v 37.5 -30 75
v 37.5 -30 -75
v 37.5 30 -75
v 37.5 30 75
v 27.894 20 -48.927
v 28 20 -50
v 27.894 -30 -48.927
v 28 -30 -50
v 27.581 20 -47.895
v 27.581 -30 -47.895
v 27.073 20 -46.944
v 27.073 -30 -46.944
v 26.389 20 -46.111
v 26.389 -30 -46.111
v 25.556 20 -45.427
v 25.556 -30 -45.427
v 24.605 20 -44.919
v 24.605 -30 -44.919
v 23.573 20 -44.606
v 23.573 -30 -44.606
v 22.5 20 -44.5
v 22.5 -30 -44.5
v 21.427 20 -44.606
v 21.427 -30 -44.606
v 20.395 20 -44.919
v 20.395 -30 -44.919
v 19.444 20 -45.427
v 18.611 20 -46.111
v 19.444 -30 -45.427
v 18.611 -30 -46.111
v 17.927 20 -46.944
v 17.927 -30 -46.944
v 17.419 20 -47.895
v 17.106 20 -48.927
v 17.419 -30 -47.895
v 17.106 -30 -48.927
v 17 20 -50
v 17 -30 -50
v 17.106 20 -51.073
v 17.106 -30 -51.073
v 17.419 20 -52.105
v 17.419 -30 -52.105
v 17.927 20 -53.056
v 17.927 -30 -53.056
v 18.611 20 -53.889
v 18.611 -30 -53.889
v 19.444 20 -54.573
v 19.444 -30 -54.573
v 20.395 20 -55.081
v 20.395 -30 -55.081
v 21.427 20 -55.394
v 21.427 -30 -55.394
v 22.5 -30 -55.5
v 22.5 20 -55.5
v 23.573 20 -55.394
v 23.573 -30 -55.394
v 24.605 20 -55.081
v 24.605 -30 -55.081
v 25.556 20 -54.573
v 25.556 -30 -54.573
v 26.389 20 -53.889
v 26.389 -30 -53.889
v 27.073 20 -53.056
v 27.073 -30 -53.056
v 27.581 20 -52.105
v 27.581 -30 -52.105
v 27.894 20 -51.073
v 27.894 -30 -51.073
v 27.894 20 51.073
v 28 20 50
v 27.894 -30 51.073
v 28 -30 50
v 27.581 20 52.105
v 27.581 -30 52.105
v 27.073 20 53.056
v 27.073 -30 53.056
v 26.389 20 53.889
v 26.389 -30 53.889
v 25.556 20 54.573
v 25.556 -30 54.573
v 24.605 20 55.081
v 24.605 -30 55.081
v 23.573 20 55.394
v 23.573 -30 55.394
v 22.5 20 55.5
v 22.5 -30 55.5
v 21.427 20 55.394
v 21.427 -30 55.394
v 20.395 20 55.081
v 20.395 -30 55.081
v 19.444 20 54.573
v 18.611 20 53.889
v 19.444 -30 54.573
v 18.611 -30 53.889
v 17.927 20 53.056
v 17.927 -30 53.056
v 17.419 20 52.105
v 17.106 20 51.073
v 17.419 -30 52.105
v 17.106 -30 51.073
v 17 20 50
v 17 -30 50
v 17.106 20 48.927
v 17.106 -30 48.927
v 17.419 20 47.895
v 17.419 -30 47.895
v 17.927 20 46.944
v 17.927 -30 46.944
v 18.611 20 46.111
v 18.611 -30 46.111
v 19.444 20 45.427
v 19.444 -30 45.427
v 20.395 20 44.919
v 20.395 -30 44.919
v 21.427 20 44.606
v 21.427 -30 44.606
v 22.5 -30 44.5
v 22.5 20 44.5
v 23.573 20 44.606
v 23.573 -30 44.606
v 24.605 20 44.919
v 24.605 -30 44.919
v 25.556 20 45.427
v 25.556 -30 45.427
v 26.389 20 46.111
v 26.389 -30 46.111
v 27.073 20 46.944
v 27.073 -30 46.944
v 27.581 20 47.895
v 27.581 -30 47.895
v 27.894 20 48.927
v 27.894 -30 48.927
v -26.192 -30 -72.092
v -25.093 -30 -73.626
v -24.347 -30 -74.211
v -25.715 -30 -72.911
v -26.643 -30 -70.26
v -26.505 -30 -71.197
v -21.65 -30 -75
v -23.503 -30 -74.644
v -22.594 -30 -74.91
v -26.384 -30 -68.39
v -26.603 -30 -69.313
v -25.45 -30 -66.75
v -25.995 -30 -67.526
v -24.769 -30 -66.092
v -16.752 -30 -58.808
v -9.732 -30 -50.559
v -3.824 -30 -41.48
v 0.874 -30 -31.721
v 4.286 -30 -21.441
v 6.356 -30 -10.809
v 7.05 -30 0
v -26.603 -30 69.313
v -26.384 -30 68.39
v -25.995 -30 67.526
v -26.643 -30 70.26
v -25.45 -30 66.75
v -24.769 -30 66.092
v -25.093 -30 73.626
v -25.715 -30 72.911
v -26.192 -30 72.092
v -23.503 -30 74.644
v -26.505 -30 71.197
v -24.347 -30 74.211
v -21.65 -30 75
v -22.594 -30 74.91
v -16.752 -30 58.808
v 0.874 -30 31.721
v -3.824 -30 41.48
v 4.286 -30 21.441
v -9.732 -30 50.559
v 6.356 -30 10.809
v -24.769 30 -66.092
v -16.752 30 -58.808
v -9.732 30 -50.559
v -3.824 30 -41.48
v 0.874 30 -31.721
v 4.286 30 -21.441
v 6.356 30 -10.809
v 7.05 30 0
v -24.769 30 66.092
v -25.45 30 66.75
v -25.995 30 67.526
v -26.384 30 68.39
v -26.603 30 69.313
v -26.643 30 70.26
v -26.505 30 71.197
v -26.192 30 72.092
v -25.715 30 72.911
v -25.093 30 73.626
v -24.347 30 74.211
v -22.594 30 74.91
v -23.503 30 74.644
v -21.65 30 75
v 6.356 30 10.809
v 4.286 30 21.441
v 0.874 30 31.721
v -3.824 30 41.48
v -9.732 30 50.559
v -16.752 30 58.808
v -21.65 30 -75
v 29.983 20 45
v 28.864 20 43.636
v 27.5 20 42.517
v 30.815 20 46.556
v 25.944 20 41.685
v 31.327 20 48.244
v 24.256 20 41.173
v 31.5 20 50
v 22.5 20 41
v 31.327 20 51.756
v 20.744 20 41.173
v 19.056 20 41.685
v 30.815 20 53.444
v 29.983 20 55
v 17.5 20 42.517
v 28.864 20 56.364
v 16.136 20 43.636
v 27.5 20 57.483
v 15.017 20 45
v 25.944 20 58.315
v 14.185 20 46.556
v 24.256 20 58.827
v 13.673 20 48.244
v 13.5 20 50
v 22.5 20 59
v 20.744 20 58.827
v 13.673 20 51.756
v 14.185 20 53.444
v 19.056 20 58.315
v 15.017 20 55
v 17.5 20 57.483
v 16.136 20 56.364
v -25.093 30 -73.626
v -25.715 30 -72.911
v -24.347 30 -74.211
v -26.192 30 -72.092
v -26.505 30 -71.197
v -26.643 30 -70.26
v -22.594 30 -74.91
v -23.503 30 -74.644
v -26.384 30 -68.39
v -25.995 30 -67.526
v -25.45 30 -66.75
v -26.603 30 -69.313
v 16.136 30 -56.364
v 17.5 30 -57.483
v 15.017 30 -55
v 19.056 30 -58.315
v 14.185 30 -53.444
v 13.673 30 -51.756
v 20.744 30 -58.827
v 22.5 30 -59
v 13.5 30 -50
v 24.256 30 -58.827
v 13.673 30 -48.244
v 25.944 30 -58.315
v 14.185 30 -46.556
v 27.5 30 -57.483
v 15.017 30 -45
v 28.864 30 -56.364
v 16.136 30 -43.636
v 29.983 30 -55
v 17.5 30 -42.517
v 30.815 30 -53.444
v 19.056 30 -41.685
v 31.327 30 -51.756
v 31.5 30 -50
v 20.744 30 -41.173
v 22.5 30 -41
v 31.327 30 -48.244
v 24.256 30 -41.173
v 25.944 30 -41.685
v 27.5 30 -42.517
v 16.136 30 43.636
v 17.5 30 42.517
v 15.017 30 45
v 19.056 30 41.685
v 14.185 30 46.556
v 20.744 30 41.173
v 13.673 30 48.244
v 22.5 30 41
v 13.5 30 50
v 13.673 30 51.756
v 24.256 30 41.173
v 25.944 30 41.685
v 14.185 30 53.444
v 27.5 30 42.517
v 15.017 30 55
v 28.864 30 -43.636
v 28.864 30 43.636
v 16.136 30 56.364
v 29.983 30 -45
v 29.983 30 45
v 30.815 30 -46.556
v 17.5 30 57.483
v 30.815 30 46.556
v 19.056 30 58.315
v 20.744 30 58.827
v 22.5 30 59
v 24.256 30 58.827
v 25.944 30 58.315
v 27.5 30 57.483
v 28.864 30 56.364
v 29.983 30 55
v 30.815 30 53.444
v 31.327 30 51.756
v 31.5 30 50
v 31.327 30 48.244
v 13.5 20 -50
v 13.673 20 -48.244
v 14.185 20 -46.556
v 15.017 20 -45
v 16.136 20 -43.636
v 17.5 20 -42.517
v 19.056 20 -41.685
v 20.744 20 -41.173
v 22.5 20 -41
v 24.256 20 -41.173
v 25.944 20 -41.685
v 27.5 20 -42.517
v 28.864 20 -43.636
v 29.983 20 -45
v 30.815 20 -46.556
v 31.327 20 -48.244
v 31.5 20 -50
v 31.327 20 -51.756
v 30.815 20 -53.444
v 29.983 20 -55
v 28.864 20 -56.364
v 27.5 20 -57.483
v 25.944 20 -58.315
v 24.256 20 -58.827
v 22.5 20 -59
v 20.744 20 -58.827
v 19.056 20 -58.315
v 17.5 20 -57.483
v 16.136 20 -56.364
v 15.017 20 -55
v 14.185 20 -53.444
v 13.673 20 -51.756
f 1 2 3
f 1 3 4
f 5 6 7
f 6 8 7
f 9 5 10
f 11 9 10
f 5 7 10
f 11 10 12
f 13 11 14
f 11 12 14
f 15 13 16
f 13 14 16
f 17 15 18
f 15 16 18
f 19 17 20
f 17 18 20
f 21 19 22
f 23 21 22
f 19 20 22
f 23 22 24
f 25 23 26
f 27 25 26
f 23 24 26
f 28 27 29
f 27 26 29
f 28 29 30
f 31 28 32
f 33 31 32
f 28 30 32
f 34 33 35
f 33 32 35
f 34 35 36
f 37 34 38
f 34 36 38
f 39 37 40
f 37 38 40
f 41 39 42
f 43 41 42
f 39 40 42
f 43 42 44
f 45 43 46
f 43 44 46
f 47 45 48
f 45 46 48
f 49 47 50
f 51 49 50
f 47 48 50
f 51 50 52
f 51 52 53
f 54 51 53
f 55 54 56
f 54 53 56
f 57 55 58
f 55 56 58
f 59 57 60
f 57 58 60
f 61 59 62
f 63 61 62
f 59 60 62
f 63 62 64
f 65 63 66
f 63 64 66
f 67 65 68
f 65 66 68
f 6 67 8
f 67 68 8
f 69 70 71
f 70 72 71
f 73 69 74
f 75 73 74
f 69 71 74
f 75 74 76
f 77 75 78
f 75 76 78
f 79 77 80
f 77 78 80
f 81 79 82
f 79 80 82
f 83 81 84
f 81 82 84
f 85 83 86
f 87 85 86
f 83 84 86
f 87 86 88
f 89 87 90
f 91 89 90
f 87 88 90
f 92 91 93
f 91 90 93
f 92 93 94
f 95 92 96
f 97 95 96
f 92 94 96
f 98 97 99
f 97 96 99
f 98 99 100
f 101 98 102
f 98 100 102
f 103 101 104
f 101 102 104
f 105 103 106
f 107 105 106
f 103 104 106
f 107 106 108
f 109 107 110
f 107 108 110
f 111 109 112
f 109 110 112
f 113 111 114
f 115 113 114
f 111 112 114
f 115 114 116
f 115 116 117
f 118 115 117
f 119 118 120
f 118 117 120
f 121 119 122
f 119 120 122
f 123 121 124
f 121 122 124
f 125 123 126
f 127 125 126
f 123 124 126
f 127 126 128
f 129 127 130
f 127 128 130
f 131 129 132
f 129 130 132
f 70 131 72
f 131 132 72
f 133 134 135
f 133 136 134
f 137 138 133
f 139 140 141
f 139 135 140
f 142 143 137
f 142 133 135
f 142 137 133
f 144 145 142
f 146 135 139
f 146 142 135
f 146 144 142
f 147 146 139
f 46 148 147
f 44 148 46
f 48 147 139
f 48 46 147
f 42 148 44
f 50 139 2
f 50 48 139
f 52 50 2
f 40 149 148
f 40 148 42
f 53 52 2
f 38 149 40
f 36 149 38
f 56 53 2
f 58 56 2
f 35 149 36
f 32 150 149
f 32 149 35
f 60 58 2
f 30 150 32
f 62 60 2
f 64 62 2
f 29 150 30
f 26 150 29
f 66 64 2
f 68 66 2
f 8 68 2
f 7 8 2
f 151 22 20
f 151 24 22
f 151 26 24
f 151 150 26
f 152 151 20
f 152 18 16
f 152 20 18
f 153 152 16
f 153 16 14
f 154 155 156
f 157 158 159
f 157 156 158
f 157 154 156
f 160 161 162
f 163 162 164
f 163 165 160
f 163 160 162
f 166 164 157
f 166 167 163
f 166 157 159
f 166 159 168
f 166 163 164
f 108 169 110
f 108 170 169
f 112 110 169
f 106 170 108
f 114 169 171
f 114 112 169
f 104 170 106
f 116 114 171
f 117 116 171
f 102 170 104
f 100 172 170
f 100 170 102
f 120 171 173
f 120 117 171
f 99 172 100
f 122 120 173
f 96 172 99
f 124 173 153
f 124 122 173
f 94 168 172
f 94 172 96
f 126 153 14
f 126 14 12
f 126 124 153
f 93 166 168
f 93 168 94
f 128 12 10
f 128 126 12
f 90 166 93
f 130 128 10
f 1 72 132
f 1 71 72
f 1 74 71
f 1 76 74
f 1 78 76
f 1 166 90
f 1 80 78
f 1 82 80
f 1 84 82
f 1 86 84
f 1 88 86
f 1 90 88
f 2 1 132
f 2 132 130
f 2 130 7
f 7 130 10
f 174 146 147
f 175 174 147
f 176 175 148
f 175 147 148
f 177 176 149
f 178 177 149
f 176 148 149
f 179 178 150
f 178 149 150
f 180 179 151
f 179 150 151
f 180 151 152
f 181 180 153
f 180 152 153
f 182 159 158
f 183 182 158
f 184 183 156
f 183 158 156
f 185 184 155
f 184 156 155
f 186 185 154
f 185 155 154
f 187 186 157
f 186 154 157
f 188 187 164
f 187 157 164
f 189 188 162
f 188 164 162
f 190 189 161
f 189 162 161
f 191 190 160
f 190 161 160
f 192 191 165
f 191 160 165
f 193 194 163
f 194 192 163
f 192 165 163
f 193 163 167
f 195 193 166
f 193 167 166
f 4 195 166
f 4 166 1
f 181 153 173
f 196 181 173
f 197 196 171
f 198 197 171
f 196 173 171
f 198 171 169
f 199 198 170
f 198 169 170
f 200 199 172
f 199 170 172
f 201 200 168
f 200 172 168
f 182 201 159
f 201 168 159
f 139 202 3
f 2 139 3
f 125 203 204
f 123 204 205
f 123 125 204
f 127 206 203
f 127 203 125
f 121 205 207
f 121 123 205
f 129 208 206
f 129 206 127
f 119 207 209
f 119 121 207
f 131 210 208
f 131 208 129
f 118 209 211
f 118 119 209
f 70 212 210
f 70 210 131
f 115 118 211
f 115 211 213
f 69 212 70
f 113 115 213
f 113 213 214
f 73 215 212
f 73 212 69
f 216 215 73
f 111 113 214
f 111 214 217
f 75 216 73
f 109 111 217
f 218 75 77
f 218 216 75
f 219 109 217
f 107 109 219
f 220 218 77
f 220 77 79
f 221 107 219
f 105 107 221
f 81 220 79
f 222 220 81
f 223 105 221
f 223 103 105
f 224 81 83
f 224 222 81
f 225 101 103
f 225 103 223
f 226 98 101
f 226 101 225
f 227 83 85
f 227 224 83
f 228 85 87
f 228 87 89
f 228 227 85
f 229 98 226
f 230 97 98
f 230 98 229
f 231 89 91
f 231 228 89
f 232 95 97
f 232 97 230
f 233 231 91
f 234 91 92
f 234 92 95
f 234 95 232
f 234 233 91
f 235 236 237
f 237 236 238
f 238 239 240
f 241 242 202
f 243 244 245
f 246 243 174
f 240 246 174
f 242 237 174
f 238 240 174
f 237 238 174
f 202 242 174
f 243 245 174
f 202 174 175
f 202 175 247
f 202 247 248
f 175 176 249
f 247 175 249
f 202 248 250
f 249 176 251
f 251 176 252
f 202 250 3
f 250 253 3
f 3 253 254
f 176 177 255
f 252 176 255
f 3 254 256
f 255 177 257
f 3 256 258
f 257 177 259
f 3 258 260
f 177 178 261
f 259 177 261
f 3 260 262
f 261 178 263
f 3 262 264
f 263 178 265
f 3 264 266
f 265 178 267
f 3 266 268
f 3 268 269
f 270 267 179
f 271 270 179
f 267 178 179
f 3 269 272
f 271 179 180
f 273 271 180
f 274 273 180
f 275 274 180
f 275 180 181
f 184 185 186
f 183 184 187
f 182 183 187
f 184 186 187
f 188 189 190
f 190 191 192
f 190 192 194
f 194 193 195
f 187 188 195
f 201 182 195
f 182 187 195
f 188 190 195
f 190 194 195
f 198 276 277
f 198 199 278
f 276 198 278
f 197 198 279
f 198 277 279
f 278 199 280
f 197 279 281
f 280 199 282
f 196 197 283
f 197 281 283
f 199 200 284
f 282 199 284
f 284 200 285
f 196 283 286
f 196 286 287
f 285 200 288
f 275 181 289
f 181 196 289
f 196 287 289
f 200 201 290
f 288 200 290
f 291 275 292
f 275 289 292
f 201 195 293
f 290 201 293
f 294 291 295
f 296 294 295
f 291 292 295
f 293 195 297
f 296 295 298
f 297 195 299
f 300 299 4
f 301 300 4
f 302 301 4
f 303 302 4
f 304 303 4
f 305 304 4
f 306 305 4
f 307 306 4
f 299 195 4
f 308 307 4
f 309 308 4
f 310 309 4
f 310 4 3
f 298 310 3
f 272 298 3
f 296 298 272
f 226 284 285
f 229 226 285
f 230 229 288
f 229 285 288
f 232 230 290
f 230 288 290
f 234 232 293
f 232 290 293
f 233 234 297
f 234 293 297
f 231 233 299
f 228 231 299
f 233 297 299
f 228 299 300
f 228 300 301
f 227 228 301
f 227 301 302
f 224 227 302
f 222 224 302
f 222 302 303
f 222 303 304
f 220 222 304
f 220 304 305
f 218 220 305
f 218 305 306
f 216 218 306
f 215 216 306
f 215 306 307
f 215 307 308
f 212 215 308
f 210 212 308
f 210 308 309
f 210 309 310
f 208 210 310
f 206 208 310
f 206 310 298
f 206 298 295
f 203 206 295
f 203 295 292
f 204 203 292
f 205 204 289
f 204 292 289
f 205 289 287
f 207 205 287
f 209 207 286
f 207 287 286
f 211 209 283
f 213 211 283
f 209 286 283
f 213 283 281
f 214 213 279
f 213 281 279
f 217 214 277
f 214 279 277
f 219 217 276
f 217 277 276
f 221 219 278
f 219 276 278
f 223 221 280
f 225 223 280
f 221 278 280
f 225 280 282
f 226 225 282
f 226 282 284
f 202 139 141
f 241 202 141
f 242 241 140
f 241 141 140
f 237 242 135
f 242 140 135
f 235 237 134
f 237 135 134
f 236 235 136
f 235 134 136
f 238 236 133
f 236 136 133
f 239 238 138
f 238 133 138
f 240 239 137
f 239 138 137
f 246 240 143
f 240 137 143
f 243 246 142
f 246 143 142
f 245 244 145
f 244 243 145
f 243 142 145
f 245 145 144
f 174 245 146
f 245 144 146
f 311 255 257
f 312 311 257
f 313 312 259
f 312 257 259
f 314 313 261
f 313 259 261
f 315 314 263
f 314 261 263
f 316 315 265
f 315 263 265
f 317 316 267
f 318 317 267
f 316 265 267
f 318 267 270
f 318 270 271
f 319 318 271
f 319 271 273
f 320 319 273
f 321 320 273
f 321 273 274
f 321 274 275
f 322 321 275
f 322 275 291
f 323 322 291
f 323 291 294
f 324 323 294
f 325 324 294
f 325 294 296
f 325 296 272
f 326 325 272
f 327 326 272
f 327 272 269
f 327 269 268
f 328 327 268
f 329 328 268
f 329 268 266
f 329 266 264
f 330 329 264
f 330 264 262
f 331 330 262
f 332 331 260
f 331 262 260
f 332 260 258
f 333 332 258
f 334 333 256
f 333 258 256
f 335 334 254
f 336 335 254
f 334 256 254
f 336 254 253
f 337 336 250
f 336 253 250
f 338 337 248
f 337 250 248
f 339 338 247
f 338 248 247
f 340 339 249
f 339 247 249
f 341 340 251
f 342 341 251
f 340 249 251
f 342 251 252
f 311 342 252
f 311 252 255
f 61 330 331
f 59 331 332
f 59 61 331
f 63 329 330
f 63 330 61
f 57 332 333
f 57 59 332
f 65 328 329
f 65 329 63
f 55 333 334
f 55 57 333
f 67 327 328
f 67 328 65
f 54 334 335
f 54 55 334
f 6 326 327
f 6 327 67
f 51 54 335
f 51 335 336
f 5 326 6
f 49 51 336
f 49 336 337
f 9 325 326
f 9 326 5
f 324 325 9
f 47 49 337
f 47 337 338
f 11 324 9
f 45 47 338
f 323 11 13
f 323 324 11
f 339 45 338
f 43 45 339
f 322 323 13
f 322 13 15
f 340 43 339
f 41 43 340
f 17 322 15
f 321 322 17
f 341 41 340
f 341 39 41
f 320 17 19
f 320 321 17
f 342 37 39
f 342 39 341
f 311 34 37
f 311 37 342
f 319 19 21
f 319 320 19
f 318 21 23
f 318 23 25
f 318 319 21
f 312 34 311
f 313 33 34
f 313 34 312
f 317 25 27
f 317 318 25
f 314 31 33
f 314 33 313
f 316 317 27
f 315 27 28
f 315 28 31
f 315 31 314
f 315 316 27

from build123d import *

# Parameters (mm, degrees)
F0_W           = 75
F0_H           = 150
F1_DEPTH       = 30
F3_DEPTH       = 60.001
F5_D           = 11
F5_CBORE_D     = 18
F5_CBORE_DEPTH = 10


with BuildPart() as f1:
    # F0 (on Front) → F1 (new body, symmetric)
    with BuildSketch(Plane.XZ):
        Rectangle(F0_W, F0_H)
    extrude(amount=F1_DEPTH, both=True)

    # F2 (on face) → F3 (cut, through all)
    with BuildSketch(Plane.XZ.offset(30)):
        with BuildLine():
            ThreePointArc((-24.768539, -66.091569), (-1.31881, -36.675997), (7.05, 0))
            ThreePointArc((7.05, 0), (-1.31881, 36.675997), (-24.768539, 66.091569))
            ThreePointArc((-24.768539, 66.091569), (-162.05, 0), (-24.768539, -66.091569))
        make_face()
        with BuildLine():
            ThreePointArc((-37.5, 74.489613), (-30.944519, 70.578253), (-24.768539, 66.091569))
            ThreePointArc((-24.768539, 66.091569), (-26.369403, 71.651945), (-21.650179, 75))
            Line((-21.650179, 75), (-37.5, 75))
            Line((-37.5, 75), (-37.5, 74.489613))
        make_face()
        with BuildLine():
            ThreePointArc((-21.650179, -75), (-26.369403, -71.651945), (-24.768539, -66.091569))
            ThreePointArc((-24.768539, -66.091569), (-30.944519, -70.578253), (-37.5, -74.489613))
            Line((-37.5, -74.489613), (-37.5, -75))
            Line((-37.5, -75), (-21.650179, -75))
        make_face()
    extrude(amount=-F3_DEPTH, mode=Mode.SUBTRACT)

    # F5 (through all)
    with Locations(Plane(origin=(0, 30, 0), x_dir=(-1, 0, 0), z_dir=(0, 1, 0))):
        with Locations((-22.5, 50), (-22.5, -50)):
            CounterBoreHole(F5_D / 2, F5_CBORE_D / 2, F5_CBORE_DEPTH)


solid = f1.part
